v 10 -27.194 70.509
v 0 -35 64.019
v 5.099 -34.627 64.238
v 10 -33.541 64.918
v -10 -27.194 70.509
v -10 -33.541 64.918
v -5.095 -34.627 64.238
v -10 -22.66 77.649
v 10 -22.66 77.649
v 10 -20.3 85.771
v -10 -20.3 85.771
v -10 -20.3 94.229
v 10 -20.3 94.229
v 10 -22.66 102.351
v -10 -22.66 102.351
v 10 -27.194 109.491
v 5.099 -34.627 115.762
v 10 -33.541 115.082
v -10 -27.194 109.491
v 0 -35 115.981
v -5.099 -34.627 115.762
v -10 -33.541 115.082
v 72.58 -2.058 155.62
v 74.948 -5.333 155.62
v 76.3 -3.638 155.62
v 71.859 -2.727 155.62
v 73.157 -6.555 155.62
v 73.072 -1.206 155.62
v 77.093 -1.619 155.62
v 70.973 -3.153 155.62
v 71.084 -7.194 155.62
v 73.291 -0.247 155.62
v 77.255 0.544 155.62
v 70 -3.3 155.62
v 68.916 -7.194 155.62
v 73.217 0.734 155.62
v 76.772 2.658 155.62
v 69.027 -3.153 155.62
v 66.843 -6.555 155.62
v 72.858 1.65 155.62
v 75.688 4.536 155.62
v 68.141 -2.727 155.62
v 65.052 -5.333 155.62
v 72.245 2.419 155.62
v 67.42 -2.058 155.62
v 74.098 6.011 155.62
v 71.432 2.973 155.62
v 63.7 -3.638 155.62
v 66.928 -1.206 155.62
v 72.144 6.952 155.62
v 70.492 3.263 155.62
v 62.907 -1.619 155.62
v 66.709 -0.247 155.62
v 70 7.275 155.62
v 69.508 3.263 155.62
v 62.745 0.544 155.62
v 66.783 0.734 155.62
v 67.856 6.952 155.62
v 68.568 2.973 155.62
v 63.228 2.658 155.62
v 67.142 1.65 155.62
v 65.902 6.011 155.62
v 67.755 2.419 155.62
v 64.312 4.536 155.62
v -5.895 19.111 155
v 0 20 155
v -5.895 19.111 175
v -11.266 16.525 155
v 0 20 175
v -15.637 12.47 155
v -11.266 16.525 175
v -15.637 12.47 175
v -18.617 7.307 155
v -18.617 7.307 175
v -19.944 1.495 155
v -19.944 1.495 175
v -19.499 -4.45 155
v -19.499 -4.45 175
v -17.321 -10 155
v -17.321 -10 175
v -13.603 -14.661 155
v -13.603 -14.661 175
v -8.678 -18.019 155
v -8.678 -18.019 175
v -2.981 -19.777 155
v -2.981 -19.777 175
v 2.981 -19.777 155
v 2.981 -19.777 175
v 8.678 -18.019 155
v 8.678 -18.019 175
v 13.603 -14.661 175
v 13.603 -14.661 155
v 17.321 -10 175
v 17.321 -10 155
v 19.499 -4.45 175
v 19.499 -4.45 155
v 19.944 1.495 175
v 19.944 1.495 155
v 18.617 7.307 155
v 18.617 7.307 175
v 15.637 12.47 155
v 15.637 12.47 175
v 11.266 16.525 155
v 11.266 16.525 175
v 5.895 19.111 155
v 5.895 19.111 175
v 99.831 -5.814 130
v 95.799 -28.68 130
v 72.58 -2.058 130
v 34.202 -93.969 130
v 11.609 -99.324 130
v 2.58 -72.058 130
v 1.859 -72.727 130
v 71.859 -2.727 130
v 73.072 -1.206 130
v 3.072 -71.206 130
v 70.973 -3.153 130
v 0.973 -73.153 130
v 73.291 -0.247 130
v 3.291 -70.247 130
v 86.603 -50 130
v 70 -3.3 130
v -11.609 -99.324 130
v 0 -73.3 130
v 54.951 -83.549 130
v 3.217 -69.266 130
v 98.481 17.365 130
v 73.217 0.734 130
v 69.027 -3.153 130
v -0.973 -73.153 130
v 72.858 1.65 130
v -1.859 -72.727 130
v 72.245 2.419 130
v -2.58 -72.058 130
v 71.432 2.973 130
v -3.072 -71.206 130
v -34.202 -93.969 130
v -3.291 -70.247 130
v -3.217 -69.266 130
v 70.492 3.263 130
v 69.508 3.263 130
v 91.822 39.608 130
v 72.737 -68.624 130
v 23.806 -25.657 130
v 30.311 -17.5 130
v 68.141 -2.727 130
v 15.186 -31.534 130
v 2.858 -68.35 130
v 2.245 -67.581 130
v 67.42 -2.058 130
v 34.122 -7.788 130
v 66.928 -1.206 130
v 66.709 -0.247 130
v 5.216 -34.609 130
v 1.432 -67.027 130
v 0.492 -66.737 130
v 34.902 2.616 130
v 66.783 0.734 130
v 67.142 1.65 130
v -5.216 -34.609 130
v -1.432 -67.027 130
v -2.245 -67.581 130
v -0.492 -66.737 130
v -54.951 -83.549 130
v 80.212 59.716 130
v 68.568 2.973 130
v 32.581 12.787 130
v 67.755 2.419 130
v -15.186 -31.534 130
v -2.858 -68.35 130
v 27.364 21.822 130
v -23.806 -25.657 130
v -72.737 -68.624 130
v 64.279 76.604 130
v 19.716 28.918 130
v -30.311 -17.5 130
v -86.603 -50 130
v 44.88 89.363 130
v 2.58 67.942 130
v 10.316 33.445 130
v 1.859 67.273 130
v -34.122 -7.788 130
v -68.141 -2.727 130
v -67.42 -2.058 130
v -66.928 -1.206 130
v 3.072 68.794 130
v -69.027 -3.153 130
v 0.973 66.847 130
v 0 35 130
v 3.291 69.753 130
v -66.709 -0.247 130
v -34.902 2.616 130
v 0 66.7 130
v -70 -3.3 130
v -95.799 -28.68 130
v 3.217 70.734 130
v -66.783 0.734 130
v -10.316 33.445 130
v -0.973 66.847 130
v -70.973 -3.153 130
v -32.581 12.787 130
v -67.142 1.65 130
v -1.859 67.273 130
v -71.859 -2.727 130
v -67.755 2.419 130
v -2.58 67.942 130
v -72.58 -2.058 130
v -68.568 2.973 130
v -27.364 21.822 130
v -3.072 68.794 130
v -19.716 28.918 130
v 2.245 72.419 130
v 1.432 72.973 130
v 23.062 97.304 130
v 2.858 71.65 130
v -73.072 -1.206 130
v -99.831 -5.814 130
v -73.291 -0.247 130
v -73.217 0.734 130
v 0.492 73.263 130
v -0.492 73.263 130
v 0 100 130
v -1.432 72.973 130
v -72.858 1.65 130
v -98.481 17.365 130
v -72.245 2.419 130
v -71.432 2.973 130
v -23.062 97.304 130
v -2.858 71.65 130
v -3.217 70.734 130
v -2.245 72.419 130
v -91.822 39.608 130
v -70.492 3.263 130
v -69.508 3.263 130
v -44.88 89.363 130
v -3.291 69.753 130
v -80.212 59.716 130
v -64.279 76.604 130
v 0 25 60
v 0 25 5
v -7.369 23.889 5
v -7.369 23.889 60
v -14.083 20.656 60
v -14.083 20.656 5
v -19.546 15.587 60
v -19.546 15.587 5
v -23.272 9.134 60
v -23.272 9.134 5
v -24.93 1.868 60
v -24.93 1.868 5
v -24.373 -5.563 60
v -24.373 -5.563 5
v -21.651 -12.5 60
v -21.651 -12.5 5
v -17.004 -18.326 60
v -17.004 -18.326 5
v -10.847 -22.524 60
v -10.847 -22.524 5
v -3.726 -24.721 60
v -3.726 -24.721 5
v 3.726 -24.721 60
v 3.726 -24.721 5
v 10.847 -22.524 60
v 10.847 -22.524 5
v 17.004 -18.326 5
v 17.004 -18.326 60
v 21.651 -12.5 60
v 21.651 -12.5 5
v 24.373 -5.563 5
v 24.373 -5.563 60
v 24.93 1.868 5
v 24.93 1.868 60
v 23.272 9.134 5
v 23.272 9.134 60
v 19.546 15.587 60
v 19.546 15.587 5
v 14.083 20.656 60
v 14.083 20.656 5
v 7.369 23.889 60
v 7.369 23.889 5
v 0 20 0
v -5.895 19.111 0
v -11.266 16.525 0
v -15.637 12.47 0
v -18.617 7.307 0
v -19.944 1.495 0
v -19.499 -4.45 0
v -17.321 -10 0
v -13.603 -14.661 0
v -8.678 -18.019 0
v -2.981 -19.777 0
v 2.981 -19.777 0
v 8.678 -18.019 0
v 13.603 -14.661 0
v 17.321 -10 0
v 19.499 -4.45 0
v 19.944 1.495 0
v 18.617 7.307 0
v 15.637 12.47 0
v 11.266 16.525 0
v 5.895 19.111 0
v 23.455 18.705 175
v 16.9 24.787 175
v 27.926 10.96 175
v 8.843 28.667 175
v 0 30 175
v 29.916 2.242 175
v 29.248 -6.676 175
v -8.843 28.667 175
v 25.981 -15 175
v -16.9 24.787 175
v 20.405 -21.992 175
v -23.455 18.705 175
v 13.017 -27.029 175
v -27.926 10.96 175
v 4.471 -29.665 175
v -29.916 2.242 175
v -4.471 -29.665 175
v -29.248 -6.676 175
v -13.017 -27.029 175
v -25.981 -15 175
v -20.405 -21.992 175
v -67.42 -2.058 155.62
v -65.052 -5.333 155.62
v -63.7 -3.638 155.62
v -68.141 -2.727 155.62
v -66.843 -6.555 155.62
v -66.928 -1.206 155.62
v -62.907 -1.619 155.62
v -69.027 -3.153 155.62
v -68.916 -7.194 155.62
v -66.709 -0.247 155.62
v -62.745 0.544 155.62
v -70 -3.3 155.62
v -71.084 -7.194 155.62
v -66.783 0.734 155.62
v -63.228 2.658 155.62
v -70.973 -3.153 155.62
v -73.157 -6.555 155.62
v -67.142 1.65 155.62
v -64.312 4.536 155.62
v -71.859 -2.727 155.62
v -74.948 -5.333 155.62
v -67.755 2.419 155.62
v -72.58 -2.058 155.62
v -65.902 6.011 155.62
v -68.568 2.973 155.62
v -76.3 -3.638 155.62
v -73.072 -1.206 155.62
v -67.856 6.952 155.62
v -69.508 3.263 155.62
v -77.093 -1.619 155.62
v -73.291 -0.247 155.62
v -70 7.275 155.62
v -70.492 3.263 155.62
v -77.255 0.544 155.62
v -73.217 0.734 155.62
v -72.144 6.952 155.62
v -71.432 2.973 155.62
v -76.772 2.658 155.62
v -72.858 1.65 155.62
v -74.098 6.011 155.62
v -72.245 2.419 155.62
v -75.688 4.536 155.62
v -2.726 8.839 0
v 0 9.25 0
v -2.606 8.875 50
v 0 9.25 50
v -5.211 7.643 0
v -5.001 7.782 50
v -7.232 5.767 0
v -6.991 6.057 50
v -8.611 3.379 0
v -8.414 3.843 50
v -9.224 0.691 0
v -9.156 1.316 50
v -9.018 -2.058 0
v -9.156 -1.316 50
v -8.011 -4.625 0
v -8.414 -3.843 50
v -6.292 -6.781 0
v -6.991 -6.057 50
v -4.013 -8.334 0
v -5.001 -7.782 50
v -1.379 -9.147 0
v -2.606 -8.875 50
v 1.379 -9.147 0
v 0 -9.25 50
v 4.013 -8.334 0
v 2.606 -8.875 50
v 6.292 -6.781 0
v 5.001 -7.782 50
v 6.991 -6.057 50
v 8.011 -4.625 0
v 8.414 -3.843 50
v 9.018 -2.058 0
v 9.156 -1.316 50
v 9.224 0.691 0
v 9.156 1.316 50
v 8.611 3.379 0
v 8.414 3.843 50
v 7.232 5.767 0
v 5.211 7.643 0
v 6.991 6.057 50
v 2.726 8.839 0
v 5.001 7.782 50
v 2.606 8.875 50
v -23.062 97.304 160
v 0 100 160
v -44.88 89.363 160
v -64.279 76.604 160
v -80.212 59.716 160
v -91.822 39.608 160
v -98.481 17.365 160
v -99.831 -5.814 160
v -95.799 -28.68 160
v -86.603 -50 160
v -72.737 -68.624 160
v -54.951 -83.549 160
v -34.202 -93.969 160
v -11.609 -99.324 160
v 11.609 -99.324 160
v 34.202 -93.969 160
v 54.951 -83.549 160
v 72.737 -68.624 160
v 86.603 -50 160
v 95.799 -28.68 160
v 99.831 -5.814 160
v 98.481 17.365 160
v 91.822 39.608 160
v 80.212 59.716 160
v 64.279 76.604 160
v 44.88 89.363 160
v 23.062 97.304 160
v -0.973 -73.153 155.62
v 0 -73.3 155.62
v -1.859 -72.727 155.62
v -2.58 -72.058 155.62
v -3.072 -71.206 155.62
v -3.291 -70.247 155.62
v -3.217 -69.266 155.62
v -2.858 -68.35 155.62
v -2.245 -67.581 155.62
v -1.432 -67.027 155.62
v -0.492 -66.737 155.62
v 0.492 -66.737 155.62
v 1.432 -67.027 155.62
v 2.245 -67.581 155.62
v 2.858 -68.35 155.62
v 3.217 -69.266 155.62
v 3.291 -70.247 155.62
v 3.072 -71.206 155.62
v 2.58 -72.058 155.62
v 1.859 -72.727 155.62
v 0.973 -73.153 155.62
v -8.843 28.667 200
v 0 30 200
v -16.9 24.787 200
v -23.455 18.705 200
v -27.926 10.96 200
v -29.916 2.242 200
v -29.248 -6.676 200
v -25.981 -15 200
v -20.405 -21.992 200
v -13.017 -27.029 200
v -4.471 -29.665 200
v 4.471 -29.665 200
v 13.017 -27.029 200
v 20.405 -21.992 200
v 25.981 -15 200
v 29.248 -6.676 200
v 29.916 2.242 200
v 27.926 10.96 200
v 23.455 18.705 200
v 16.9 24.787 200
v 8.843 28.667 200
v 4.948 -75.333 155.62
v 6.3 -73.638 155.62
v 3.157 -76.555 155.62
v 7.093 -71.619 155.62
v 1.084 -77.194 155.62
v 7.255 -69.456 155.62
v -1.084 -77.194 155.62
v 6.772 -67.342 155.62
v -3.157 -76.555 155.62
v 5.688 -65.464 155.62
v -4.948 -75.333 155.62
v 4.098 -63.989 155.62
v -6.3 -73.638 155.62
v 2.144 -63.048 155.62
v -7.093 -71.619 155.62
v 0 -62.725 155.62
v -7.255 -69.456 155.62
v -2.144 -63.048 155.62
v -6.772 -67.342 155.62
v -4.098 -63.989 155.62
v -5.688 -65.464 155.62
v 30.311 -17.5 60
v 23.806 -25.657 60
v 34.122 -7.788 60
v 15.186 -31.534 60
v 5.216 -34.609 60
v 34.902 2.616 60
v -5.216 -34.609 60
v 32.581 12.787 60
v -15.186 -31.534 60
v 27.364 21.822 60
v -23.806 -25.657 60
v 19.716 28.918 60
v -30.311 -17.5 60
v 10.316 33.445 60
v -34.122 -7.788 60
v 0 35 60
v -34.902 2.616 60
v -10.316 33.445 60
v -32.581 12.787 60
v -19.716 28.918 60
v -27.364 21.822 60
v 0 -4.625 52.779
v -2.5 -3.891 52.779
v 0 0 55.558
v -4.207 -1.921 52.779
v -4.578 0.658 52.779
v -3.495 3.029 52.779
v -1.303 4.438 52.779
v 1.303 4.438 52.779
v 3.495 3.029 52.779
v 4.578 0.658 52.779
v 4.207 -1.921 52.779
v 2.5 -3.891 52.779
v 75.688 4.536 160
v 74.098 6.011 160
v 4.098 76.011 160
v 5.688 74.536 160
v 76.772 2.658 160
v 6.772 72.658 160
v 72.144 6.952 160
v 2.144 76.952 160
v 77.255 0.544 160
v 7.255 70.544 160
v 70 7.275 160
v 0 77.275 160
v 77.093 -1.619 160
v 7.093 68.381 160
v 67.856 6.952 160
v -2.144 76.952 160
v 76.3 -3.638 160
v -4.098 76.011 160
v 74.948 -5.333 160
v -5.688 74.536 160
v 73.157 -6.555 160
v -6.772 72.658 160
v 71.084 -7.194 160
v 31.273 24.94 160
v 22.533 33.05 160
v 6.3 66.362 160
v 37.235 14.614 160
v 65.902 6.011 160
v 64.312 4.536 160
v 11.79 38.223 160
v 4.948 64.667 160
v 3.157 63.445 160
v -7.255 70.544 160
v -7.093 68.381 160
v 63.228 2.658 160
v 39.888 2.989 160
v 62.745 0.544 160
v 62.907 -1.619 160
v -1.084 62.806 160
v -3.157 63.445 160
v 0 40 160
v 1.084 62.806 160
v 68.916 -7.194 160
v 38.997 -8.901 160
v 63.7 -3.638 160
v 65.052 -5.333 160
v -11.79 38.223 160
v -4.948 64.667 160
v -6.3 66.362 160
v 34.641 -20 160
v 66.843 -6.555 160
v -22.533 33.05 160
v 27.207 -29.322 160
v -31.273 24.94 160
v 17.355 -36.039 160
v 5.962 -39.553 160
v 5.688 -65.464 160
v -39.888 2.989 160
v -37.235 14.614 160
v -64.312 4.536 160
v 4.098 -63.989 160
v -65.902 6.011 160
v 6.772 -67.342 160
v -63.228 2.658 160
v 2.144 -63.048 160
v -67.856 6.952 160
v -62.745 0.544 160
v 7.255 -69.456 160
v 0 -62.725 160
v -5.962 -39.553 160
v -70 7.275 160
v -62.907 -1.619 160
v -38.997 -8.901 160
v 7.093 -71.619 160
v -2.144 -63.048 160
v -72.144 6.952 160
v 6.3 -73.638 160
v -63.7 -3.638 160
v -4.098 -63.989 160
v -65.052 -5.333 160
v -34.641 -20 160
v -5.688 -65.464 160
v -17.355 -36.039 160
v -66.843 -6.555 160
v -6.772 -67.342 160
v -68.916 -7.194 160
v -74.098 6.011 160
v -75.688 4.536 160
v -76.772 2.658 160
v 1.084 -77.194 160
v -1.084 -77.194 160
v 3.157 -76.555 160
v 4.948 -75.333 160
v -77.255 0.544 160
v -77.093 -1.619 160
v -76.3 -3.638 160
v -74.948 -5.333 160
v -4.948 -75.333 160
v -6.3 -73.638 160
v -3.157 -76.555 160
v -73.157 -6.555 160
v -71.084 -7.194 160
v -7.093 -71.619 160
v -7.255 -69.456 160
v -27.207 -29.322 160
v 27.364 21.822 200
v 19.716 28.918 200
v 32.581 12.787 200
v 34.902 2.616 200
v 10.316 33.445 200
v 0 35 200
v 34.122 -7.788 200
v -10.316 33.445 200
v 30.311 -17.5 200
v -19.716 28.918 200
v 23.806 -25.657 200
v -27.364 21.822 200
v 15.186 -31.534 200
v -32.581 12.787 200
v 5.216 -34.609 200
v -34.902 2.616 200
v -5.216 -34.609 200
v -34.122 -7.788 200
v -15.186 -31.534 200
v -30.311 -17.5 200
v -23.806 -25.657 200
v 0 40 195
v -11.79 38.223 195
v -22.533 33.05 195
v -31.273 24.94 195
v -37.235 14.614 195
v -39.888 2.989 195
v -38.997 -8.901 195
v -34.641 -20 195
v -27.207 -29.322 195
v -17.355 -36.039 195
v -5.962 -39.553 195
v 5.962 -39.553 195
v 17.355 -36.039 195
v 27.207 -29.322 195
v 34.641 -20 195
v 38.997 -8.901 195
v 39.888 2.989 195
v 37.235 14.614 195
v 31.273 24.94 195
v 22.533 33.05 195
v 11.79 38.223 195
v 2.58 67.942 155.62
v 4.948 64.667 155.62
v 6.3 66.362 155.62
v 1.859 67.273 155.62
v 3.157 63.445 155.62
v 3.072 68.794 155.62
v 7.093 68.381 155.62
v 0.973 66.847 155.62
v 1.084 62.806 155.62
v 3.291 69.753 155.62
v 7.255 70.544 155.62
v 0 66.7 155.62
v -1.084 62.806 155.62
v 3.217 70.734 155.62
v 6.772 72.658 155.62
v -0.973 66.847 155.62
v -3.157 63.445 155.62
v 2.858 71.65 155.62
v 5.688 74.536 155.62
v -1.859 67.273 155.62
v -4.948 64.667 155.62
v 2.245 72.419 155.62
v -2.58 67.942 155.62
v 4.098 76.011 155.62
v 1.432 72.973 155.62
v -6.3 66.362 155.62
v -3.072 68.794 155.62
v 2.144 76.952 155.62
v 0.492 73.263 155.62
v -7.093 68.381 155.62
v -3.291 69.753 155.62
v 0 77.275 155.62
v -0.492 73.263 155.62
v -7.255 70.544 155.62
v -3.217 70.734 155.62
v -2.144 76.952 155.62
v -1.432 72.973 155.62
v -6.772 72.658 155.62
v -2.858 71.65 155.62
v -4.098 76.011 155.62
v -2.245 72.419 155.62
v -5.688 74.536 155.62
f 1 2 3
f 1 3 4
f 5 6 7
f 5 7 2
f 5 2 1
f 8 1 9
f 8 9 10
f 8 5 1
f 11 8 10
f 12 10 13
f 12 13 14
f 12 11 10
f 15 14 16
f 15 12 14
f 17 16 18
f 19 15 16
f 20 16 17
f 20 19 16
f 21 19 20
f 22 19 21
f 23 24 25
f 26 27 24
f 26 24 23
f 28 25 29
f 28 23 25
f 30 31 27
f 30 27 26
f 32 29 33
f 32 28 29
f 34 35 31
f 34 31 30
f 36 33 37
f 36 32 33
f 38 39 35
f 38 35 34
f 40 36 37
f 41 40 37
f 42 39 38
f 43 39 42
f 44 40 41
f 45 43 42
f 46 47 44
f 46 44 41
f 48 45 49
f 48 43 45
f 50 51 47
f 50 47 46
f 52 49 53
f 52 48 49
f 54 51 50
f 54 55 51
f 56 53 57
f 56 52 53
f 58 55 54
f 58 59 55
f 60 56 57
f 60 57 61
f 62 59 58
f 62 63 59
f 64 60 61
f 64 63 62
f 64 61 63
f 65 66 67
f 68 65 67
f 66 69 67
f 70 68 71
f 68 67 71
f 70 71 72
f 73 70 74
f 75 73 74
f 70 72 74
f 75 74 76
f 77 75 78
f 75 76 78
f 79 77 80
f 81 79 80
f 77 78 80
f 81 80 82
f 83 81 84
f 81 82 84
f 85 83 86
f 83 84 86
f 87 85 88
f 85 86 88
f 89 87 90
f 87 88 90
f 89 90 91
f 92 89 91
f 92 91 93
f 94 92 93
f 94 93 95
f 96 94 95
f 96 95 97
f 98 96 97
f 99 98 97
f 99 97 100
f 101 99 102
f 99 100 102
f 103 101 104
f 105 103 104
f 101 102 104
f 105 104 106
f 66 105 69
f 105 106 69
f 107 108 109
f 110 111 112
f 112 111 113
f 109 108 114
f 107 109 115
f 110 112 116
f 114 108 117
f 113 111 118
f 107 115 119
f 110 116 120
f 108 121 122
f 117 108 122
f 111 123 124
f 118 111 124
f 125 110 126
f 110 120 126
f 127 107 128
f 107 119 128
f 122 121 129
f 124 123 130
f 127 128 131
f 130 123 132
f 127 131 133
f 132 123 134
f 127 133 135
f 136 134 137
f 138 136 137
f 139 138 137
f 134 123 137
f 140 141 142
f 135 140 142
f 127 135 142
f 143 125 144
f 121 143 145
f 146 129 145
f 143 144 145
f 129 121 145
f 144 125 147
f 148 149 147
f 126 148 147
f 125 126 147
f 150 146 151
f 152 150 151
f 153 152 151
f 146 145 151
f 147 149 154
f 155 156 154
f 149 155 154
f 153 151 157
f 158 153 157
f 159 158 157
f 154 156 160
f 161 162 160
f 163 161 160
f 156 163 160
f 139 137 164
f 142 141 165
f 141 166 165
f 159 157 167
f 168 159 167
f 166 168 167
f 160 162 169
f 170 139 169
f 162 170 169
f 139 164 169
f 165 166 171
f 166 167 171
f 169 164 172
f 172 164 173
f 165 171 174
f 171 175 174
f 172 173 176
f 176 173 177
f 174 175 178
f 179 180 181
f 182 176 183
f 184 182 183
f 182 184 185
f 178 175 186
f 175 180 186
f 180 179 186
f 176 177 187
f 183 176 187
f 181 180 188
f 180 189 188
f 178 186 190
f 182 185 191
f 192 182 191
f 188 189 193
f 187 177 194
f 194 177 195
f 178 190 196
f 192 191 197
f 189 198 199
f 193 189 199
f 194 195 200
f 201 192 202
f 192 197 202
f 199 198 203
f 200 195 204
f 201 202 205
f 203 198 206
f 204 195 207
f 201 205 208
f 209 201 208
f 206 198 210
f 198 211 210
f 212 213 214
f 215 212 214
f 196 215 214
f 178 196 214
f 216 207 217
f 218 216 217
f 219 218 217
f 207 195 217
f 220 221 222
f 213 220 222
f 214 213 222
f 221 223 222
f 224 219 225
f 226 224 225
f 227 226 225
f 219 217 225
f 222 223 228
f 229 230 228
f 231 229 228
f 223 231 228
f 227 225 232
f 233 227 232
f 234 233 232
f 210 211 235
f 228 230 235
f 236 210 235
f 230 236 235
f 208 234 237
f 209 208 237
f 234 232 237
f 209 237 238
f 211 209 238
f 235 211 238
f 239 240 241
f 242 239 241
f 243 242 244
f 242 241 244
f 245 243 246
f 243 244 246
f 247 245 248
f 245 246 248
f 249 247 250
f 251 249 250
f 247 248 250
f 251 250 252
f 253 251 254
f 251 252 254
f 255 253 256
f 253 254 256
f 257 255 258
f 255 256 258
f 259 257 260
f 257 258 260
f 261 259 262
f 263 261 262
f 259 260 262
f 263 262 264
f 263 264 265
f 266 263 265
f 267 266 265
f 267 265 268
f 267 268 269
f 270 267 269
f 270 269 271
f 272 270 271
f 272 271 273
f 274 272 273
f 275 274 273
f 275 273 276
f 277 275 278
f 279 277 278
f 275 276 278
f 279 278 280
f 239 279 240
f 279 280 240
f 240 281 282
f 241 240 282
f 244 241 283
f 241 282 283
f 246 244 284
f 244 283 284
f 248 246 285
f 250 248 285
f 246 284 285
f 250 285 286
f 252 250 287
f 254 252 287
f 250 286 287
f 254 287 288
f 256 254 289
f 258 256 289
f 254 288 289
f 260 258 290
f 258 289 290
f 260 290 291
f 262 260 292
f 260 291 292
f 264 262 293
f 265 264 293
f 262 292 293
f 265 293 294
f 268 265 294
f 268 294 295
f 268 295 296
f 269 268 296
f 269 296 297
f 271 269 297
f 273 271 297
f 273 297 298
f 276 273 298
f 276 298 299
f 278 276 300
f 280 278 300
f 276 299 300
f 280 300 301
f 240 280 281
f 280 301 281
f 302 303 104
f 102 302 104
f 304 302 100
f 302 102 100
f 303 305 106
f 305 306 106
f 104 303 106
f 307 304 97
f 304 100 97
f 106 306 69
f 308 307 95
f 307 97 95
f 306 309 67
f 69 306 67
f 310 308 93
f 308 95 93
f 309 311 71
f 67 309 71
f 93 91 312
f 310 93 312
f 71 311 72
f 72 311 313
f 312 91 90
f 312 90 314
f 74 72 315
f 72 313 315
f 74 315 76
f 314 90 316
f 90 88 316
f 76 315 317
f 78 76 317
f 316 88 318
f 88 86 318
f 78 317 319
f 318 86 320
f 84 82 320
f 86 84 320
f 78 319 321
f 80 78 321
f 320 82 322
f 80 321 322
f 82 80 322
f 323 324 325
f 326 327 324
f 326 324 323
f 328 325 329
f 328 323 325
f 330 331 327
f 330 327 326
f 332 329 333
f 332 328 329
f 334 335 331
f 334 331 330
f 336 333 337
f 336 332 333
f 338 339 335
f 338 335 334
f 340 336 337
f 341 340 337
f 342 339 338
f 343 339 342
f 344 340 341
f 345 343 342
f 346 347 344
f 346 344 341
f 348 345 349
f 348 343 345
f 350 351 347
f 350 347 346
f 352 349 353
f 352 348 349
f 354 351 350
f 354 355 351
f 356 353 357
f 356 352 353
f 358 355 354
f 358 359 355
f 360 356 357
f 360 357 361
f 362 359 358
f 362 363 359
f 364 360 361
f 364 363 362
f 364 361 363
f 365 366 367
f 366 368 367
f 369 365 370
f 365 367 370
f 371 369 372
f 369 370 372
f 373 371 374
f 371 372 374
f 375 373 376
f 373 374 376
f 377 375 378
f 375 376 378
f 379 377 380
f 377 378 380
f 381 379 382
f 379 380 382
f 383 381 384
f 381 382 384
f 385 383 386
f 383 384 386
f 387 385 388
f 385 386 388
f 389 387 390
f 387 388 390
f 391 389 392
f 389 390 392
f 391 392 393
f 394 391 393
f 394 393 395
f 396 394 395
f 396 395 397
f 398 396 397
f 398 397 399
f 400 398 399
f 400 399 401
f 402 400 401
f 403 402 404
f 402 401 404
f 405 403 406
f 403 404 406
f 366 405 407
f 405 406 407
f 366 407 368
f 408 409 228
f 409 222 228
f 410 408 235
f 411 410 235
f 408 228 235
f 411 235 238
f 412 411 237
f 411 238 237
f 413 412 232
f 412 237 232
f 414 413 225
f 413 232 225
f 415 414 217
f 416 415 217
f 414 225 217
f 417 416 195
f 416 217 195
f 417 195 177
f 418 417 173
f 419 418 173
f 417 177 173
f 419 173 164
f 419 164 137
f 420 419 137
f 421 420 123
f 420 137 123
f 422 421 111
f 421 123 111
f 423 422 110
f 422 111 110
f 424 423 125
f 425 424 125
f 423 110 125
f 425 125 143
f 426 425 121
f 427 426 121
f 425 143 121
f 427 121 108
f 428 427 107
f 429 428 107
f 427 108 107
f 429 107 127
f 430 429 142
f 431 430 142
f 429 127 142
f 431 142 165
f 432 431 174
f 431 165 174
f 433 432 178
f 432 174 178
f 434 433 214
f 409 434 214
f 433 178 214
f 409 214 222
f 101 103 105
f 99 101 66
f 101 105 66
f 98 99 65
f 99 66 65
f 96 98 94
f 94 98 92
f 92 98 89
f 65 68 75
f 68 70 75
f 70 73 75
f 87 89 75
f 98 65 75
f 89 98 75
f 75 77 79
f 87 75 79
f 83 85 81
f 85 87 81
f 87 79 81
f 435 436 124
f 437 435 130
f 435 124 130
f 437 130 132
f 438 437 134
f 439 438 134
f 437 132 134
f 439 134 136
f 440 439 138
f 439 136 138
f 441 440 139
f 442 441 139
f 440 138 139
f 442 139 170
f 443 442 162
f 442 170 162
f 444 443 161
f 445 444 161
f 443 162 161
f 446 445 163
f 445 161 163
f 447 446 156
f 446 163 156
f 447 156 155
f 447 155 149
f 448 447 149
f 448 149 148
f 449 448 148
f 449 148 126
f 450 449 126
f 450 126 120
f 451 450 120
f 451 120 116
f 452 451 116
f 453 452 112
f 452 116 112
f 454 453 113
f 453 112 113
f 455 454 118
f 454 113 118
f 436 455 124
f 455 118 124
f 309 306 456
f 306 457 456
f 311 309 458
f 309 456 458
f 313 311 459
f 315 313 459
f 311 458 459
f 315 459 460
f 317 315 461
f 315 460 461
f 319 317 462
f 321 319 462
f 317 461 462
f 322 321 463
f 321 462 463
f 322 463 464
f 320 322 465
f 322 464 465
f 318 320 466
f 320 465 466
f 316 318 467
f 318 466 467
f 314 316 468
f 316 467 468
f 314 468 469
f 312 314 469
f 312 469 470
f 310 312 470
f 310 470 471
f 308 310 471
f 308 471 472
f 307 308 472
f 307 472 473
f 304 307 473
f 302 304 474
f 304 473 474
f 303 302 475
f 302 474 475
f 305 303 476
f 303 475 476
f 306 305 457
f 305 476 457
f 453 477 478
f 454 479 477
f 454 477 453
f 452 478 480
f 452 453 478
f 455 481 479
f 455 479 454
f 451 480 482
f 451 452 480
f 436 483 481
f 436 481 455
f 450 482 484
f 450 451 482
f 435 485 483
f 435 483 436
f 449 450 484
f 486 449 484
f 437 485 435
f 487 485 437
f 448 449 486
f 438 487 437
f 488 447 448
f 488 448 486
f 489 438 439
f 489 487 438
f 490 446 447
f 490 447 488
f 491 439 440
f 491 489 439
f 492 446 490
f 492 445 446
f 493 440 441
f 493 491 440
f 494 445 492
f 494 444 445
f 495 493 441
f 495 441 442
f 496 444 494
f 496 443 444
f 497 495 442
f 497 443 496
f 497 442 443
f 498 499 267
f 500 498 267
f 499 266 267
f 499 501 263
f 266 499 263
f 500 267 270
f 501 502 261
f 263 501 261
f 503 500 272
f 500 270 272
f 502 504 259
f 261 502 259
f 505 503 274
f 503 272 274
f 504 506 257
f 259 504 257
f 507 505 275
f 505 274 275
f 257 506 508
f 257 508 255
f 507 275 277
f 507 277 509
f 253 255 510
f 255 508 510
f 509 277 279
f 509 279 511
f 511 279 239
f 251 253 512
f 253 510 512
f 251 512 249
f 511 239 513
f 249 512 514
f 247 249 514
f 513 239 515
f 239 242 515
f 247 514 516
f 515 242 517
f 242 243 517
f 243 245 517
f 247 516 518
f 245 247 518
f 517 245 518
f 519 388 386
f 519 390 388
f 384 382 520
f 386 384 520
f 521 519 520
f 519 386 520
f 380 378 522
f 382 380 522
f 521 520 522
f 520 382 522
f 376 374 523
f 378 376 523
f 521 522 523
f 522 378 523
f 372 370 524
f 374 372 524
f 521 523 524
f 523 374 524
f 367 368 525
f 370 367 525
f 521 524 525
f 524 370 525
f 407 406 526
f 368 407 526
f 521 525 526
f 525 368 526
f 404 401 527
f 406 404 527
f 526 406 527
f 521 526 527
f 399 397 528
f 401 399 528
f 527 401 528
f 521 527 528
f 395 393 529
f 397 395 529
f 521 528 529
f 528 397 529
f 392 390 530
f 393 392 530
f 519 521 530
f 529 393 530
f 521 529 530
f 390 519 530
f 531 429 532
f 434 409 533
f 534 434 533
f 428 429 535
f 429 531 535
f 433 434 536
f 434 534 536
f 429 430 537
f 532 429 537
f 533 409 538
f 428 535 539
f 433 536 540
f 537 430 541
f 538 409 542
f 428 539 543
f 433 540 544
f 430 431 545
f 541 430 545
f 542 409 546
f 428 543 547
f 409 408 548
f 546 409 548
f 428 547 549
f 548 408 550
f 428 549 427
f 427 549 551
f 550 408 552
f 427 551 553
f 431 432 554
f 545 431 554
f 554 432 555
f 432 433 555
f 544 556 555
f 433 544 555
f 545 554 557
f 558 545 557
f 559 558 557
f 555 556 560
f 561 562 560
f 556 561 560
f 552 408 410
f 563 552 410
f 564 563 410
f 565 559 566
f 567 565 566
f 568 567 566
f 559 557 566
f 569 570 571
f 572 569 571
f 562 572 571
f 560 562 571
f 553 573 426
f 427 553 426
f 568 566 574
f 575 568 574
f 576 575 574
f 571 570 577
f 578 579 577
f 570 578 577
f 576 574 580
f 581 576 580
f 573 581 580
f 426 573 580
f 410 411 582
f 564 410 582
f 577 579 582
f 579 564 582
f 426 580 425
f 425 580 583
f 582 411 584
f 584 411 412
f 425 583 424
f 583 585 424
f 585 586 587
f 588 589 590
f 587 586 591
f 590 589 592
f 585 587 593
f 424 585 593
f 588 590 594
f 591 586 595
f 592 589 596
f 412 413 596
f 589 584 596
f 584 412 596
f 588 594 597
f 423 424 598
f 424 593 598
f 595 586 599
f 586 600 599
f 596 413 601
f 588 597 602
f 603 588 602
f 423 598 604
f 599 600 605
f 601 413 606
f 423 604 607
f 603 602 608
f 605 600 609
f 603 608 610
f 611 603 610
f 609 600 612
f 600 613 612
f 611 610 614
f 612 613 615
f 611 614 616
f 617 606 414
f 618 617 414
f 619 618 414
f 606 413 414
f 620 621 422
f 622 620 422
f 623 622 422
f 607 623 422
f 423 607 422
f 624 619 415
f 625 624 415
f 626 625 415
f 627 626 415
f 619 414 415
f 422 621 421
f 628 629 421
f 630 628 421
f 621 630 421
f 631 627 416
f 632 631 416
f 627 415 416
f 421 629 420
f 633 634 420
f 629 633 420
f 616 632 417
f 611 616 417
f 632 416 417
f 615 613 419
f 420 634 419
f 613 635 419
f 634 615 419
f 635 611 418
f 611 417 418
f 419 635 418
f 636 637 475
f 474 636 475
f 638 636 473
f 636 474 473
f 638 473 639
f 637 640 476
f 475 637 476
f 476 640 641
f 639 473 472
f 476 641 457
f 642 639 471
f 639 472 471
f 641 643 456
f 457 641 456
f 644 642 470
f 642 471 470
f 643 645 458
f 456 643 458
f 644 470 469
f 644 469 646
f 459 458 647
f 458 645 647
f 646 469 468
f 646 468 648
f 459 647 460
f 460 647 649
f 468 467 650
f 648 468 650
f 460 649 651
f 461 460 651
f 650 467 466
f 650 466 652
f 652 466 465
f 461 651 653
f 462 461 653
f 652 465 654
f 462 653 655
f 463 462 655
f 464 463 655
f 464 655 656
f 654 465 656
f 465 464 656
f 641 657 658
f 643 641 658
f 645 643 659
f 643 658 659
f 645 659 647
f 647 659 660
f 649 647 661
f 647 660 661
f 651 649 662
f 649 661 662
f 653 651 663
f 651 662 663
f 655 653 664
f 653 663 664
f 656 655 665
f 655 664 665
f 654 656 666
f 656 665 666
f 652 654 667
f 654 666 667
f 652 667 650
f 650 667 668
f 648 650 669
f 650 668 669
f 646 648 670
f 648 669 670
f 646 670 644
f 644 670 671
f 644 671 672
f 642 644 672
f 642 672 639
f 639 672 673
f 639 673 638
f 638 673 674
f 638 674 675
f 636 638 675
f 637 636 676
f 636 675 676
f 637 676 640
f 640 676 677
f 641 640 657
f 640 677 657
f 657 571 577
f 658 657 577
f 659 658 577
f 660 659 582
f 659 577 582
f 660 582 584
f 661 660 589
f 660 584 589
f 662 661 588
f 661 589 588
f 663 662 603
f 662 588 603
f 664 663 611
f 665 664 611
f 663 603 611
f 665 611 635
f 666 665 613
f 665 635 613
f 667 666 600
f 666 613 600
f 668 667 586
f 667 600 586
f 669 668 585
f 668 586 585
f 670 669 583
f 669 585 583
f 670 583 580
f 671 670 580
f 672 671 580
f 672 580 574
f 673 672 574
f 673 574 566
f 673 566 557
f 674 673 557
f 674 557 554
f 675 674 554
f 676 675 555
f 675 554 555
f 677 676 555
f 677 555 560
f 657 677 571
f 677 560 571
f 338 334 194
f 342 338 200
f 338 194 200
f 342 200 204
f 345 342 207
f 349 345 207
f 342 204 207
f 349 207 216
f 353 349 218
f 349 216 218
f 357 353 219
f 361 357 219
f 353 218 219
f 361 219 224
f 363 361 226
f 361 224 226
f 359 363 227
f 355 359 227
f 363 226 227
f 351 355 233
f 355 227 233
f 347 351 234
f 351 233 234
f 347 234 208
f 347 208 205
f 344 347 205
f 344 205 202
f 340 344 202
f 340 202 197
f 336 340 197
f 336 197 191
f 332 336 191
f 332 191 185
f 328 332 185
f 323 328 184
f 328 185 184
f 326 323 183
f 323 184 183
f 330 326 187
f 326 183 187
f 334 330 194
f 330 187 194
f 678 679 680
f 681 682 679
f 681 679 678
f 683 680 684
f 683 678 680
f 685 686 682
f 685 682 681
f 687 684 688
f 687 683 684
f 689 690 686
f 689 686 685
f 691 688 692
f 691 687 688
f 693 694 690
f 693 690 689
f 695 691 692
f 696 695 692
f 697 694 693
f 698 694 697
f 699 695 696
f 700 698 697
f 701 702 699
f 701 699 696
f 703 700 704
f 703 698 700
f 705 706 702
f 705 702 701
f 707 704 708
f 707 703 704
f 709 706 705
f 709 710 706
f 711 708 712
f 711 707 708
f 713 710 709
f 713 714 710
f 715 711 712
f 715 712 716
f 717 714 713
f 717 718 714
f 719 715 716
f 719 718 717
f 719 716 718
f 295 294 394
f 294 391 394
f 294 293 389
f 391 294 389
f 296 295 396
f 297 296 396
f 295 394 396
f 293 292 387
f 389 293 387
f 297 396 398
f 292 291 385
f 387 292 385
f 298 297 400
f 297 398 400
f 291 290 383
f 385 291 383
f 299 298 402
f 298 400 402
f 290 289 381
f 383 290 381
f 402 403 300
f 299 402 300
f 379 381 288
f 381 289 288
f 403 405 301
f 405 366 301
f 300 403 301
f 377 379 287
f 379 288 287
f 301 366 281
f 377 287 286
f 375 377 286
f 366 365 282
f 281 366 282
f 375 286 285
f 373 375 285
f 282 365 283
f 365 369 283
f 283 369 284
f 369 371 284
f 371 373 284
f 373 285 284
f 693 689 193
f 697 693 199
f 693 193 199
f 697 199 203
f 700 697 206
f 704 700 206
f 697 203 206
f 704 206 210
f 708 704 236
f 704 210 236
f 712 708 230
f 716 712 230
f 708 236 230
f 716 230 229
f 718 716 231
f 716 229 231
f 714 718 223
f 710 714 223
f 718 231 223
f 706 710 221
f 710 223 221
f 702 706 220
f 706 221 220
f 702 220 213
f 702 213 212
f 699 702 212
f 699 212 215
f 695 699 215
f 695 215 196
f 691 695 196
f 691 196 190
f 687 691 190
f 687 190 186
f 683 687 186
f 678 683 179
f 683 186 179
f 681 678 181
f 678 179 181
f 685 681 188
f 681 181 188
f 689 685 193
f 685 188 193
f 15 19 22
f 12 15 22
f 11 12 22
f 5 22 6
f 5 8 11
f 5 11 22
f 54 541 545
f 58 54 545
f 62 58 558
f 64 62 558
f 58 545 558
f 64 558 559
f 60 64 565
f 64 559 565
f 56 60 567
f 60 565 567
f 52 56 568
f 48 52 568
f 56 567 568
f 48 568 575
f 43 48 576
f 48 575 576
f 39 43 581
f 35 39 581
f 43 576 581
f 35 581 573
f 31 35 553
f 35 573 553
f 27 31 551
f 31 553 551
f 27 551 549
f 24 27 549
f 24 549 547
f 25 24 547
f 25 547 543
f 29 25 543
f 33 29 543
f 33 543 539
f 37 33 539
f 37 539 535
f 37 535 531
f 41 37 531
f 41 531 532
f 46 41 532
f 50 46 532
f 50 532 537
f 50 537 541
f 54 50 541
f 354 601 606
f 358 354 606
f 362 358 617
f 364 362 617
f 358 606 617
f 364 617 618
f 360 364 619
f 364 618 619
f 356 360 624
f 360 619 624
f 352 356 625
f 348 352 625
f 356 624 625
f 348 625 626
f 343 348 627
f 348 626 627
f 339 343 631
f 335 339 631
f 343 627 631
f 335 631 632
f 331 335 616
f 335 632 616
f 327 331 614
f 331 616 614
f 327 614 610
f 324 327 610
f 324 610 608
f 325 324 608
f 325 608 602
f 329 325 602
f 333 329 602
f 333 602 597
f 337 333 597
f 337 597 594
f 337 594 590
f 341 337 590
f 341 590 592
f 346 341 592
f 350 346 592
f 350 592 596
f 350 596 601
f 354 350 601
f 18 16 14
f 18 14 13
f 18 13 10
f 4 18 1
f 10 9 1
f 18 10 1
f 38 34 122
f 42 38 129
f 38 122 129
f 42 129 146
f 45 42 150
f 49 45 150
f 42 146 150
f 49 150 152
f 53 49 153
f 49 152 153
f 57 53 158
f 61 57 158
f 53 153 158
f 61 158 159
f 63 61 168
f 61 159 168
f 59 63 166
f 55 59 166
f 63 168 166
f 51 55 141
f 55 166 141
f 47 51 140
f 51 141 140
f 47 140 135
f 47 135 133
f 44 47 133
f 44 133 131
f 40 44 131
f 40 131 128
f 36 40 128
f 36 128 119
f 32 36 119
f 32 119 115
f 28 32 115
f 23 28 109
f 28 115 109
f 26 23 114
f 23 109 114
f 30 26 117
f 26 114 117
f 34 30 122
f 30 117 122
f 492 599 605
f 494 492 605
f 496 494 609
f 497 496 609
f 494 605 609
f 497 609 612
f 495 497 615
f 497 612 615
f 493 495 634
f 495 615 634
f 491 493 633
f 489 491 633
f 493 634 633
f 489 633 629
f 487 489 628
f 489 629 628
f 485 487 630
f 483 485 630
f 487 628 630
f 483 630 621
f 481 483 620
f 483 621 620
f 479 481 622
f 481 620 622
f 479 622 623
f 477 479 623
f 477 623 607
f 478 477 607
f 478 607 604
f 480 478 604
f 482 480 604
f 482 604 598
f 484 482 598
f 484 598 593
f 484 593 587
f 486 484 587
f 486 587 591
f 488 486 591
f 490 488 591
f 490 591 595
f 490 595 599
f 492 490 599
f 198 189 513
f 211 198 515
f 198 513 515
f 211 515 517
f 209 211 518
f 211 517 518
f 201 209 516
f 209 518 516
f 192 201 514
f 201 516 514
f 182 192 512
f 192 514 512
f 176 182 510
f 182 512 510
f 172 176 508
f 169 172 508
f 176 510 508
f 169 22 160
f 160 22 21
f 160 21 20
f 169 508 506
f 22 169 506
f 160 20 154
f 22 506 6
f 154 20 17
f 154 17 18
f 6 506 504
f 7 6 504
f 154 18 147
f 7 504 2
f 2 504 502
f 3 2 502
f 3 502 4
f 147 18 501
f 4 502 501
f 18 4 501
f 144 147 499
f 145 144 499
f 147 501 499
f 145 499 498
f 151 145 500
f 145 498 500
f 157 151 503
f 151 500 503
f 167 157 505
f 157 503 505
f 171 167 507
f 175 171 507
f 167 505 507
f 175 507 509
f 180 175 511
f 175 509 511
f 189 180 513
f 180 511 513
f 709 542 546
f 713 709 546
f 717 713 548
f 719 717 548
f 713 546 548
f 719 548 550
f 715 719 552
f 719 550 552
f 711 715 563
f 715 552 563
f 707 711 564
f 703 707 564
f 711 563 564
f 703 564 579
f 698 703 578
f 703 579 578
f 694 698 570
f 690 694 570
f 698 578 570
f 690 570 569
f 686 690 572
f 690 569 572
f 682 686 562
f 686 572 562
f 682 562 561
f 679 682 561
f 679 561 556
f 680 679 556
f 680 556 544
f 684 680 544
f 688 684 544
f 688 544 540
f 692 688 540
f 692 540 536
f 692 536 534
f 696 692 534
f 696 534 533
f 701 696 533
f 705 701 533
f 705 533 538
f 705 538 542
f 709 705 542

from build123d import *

# Parameters (mm, degrees)
CUT_EXTRUDE1_DEPTH                      = 10
CUT_EXTRUDE1_DEPTH_BACK                 = 10
SKETCH2_R                               = 30
CBORE_FOR_M6_HEX_HEAD_BOLT2_D           = 6.6
CBORE_FOR_M6_HEX_HEAD_BOLT2_CBORE_D     = 14.55
CBORE_FOR_M6_HEX_HEAD_BOLT2_CBORE_DEPTH = 4.38
CHAMFER1_SIZE                           = 5
M20X1_5_TAPPED_HOLE1_D                  = 18.5
M20X1_5_TAPPED_HOLE1_DEPTH              = 50
M20X1_5_TAPPED_HOLE1_TIP                = 5.557960726


with BuildPart() as part:
    # Sketch1 → Revolve1 (revolve)
    with BuildSketch(Plane(origin=(0, 0, 0), x_dir=(0, 0, -1), z_dir=(1, 0, 0))):
        Polygon((-200, 30), (-200, 40), (-160, 40), (-160, 100), (-130, 100), (-130, 35), (-60, 35), (-60, 25), (0, 25), (0, 0), (-155, 0), (-155, 20), (-175, 20), (-175, 30), align=None)
    revolve(axis=Axis((0, 0, 0), (0, 0, 1)))

    # Sketch2 → Cut-Extrude1 (cut, two sides: drawn at the far end of the back side and taken through both)
    with BuildSketch(Plane(origin=(0, 0, 0), x_dir=(0, 0, -1), z_dir=(1, 0, 0)).offset(-CUT_EXTRUDE1_DEPTH_BACK)):
        with Locations((-90, -50)):
            Circle(SKETCH2_R)
    extrude(amount=CUT_EXTRUDE1_DEPTH + CUT_EXTRUDE1_DEPTH_BACK, mode=Mode.SUBTRACT)

    # CBORE for M6 Hex Head Bolt2 (through all)
    with Locations(Plane(origin=(0, 70, 160), x_dir=(0, 1, 0), z_dir=(0, 0, 1))):
        with Locations((0, 0), (-70, -70), (-140, 0), (-70, 70)):
            CounterBoreHole(CBORE_FOR_M6_HEX_HEAD_BOLT2_D / 2, CBORE_FOR_M6_HEX_HEAD_BOLT2_CBORE_D / 2, CBORE_FOR_M6_HEX_HEAD_BOLT2_CBORE_DEPTH)

    # Chamfer1
    chamfer1_edges = [part.edges().sort_by_distance(p)[0] for p in [
        (0, -25, 0),
        (0, -40, 200),
    ]]
    chamfer(chamfer1_edges, length=CHAMFER1_SIZE)

    # M20x1.5 Tapped Hole1
    with Locations(Plane(origin=(0, 0, 0), x_dir=(0, -1, 0), z_dir=(0, 0, -1))):
        with Locations((0, 0)):
            Hole(M20X1_5_TAPPED_HOLE1_D / 2, depth=M20X1_5_TAPPED_HOLE1_DEPTH)
            with Locations((0, 0, -(M20X1_5_TAPPED_HOLE1_DEPTH + M20X1_5_TAPPED_HOLE1_TIP / 2))):  # 118° drill point
                Cone(0, M20X1_5_TAPPED_HOLE1_D / 2, M20X1_5_TAPPED_HOLE1_TIP, mode=Mode.SUBTRACT)


solid = part.part
